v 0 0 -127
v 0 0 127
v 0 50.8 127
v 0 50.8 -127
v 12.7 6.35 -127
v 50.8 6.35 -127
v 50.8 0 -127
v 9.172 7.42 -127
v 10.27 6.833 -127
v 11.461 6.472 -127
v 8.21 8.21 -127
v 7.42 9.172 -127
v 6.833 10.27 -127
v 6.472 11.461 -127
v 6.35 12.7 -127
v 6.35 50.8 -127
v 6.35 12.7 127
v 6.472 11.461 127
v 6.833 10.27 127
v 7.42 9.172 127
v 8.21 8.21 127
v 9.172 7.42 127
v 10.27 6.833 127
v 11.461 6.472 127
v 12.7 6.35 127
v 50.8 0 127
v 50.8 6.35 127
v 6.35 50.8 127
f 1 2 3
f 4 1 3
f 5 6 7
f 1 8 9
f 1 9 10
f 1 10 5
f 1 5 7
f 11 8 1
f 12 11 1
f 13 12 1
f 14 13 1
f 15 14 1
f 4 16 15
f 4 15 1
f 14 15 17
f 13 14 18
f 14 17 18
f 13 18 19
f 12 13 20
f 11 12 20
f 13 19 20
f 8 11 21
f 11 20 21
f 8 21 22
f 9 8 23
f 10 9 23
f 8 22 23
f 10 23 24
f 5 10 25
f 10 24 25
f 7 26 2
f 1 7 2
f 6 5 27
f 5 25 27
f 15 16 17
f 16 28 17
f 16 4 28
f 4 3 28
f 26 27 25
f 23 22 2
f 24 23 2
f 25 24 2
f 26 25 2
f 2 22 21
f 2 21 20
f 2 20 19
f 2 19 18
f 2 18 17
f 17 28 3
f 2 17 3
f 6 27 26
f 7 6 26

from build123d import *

# Parameters (mm, degrees)
BOSS_EXTRUDE1_DEPTH = 127


with BuildPart() as part:
    # Sketch2 → Boss-Extrude1 (new body, symmetric)
    with BuildSketch(Plane.XY):
        with BuildLine():
            Line((0, 0), (0, 50.8))
            Line((0, 50.8), (6.35, 50.8))
            Line((6.35, 50.8), (6.35, 12.7))
            ThreePointArc((6.35, 12.7), (8.209871939, 8.209871939), (12.7, 6.35))
            Line((12.7, 6.35), (50.8, 6.35))
            Line((50.8, 6.35), (50.8, 0))
            Line((50.8, 0), (0, 0))
        make_face()
    extrude(amount=BOSS_EXTRUDE1_DEPTH, both=True)


solid = part.part
